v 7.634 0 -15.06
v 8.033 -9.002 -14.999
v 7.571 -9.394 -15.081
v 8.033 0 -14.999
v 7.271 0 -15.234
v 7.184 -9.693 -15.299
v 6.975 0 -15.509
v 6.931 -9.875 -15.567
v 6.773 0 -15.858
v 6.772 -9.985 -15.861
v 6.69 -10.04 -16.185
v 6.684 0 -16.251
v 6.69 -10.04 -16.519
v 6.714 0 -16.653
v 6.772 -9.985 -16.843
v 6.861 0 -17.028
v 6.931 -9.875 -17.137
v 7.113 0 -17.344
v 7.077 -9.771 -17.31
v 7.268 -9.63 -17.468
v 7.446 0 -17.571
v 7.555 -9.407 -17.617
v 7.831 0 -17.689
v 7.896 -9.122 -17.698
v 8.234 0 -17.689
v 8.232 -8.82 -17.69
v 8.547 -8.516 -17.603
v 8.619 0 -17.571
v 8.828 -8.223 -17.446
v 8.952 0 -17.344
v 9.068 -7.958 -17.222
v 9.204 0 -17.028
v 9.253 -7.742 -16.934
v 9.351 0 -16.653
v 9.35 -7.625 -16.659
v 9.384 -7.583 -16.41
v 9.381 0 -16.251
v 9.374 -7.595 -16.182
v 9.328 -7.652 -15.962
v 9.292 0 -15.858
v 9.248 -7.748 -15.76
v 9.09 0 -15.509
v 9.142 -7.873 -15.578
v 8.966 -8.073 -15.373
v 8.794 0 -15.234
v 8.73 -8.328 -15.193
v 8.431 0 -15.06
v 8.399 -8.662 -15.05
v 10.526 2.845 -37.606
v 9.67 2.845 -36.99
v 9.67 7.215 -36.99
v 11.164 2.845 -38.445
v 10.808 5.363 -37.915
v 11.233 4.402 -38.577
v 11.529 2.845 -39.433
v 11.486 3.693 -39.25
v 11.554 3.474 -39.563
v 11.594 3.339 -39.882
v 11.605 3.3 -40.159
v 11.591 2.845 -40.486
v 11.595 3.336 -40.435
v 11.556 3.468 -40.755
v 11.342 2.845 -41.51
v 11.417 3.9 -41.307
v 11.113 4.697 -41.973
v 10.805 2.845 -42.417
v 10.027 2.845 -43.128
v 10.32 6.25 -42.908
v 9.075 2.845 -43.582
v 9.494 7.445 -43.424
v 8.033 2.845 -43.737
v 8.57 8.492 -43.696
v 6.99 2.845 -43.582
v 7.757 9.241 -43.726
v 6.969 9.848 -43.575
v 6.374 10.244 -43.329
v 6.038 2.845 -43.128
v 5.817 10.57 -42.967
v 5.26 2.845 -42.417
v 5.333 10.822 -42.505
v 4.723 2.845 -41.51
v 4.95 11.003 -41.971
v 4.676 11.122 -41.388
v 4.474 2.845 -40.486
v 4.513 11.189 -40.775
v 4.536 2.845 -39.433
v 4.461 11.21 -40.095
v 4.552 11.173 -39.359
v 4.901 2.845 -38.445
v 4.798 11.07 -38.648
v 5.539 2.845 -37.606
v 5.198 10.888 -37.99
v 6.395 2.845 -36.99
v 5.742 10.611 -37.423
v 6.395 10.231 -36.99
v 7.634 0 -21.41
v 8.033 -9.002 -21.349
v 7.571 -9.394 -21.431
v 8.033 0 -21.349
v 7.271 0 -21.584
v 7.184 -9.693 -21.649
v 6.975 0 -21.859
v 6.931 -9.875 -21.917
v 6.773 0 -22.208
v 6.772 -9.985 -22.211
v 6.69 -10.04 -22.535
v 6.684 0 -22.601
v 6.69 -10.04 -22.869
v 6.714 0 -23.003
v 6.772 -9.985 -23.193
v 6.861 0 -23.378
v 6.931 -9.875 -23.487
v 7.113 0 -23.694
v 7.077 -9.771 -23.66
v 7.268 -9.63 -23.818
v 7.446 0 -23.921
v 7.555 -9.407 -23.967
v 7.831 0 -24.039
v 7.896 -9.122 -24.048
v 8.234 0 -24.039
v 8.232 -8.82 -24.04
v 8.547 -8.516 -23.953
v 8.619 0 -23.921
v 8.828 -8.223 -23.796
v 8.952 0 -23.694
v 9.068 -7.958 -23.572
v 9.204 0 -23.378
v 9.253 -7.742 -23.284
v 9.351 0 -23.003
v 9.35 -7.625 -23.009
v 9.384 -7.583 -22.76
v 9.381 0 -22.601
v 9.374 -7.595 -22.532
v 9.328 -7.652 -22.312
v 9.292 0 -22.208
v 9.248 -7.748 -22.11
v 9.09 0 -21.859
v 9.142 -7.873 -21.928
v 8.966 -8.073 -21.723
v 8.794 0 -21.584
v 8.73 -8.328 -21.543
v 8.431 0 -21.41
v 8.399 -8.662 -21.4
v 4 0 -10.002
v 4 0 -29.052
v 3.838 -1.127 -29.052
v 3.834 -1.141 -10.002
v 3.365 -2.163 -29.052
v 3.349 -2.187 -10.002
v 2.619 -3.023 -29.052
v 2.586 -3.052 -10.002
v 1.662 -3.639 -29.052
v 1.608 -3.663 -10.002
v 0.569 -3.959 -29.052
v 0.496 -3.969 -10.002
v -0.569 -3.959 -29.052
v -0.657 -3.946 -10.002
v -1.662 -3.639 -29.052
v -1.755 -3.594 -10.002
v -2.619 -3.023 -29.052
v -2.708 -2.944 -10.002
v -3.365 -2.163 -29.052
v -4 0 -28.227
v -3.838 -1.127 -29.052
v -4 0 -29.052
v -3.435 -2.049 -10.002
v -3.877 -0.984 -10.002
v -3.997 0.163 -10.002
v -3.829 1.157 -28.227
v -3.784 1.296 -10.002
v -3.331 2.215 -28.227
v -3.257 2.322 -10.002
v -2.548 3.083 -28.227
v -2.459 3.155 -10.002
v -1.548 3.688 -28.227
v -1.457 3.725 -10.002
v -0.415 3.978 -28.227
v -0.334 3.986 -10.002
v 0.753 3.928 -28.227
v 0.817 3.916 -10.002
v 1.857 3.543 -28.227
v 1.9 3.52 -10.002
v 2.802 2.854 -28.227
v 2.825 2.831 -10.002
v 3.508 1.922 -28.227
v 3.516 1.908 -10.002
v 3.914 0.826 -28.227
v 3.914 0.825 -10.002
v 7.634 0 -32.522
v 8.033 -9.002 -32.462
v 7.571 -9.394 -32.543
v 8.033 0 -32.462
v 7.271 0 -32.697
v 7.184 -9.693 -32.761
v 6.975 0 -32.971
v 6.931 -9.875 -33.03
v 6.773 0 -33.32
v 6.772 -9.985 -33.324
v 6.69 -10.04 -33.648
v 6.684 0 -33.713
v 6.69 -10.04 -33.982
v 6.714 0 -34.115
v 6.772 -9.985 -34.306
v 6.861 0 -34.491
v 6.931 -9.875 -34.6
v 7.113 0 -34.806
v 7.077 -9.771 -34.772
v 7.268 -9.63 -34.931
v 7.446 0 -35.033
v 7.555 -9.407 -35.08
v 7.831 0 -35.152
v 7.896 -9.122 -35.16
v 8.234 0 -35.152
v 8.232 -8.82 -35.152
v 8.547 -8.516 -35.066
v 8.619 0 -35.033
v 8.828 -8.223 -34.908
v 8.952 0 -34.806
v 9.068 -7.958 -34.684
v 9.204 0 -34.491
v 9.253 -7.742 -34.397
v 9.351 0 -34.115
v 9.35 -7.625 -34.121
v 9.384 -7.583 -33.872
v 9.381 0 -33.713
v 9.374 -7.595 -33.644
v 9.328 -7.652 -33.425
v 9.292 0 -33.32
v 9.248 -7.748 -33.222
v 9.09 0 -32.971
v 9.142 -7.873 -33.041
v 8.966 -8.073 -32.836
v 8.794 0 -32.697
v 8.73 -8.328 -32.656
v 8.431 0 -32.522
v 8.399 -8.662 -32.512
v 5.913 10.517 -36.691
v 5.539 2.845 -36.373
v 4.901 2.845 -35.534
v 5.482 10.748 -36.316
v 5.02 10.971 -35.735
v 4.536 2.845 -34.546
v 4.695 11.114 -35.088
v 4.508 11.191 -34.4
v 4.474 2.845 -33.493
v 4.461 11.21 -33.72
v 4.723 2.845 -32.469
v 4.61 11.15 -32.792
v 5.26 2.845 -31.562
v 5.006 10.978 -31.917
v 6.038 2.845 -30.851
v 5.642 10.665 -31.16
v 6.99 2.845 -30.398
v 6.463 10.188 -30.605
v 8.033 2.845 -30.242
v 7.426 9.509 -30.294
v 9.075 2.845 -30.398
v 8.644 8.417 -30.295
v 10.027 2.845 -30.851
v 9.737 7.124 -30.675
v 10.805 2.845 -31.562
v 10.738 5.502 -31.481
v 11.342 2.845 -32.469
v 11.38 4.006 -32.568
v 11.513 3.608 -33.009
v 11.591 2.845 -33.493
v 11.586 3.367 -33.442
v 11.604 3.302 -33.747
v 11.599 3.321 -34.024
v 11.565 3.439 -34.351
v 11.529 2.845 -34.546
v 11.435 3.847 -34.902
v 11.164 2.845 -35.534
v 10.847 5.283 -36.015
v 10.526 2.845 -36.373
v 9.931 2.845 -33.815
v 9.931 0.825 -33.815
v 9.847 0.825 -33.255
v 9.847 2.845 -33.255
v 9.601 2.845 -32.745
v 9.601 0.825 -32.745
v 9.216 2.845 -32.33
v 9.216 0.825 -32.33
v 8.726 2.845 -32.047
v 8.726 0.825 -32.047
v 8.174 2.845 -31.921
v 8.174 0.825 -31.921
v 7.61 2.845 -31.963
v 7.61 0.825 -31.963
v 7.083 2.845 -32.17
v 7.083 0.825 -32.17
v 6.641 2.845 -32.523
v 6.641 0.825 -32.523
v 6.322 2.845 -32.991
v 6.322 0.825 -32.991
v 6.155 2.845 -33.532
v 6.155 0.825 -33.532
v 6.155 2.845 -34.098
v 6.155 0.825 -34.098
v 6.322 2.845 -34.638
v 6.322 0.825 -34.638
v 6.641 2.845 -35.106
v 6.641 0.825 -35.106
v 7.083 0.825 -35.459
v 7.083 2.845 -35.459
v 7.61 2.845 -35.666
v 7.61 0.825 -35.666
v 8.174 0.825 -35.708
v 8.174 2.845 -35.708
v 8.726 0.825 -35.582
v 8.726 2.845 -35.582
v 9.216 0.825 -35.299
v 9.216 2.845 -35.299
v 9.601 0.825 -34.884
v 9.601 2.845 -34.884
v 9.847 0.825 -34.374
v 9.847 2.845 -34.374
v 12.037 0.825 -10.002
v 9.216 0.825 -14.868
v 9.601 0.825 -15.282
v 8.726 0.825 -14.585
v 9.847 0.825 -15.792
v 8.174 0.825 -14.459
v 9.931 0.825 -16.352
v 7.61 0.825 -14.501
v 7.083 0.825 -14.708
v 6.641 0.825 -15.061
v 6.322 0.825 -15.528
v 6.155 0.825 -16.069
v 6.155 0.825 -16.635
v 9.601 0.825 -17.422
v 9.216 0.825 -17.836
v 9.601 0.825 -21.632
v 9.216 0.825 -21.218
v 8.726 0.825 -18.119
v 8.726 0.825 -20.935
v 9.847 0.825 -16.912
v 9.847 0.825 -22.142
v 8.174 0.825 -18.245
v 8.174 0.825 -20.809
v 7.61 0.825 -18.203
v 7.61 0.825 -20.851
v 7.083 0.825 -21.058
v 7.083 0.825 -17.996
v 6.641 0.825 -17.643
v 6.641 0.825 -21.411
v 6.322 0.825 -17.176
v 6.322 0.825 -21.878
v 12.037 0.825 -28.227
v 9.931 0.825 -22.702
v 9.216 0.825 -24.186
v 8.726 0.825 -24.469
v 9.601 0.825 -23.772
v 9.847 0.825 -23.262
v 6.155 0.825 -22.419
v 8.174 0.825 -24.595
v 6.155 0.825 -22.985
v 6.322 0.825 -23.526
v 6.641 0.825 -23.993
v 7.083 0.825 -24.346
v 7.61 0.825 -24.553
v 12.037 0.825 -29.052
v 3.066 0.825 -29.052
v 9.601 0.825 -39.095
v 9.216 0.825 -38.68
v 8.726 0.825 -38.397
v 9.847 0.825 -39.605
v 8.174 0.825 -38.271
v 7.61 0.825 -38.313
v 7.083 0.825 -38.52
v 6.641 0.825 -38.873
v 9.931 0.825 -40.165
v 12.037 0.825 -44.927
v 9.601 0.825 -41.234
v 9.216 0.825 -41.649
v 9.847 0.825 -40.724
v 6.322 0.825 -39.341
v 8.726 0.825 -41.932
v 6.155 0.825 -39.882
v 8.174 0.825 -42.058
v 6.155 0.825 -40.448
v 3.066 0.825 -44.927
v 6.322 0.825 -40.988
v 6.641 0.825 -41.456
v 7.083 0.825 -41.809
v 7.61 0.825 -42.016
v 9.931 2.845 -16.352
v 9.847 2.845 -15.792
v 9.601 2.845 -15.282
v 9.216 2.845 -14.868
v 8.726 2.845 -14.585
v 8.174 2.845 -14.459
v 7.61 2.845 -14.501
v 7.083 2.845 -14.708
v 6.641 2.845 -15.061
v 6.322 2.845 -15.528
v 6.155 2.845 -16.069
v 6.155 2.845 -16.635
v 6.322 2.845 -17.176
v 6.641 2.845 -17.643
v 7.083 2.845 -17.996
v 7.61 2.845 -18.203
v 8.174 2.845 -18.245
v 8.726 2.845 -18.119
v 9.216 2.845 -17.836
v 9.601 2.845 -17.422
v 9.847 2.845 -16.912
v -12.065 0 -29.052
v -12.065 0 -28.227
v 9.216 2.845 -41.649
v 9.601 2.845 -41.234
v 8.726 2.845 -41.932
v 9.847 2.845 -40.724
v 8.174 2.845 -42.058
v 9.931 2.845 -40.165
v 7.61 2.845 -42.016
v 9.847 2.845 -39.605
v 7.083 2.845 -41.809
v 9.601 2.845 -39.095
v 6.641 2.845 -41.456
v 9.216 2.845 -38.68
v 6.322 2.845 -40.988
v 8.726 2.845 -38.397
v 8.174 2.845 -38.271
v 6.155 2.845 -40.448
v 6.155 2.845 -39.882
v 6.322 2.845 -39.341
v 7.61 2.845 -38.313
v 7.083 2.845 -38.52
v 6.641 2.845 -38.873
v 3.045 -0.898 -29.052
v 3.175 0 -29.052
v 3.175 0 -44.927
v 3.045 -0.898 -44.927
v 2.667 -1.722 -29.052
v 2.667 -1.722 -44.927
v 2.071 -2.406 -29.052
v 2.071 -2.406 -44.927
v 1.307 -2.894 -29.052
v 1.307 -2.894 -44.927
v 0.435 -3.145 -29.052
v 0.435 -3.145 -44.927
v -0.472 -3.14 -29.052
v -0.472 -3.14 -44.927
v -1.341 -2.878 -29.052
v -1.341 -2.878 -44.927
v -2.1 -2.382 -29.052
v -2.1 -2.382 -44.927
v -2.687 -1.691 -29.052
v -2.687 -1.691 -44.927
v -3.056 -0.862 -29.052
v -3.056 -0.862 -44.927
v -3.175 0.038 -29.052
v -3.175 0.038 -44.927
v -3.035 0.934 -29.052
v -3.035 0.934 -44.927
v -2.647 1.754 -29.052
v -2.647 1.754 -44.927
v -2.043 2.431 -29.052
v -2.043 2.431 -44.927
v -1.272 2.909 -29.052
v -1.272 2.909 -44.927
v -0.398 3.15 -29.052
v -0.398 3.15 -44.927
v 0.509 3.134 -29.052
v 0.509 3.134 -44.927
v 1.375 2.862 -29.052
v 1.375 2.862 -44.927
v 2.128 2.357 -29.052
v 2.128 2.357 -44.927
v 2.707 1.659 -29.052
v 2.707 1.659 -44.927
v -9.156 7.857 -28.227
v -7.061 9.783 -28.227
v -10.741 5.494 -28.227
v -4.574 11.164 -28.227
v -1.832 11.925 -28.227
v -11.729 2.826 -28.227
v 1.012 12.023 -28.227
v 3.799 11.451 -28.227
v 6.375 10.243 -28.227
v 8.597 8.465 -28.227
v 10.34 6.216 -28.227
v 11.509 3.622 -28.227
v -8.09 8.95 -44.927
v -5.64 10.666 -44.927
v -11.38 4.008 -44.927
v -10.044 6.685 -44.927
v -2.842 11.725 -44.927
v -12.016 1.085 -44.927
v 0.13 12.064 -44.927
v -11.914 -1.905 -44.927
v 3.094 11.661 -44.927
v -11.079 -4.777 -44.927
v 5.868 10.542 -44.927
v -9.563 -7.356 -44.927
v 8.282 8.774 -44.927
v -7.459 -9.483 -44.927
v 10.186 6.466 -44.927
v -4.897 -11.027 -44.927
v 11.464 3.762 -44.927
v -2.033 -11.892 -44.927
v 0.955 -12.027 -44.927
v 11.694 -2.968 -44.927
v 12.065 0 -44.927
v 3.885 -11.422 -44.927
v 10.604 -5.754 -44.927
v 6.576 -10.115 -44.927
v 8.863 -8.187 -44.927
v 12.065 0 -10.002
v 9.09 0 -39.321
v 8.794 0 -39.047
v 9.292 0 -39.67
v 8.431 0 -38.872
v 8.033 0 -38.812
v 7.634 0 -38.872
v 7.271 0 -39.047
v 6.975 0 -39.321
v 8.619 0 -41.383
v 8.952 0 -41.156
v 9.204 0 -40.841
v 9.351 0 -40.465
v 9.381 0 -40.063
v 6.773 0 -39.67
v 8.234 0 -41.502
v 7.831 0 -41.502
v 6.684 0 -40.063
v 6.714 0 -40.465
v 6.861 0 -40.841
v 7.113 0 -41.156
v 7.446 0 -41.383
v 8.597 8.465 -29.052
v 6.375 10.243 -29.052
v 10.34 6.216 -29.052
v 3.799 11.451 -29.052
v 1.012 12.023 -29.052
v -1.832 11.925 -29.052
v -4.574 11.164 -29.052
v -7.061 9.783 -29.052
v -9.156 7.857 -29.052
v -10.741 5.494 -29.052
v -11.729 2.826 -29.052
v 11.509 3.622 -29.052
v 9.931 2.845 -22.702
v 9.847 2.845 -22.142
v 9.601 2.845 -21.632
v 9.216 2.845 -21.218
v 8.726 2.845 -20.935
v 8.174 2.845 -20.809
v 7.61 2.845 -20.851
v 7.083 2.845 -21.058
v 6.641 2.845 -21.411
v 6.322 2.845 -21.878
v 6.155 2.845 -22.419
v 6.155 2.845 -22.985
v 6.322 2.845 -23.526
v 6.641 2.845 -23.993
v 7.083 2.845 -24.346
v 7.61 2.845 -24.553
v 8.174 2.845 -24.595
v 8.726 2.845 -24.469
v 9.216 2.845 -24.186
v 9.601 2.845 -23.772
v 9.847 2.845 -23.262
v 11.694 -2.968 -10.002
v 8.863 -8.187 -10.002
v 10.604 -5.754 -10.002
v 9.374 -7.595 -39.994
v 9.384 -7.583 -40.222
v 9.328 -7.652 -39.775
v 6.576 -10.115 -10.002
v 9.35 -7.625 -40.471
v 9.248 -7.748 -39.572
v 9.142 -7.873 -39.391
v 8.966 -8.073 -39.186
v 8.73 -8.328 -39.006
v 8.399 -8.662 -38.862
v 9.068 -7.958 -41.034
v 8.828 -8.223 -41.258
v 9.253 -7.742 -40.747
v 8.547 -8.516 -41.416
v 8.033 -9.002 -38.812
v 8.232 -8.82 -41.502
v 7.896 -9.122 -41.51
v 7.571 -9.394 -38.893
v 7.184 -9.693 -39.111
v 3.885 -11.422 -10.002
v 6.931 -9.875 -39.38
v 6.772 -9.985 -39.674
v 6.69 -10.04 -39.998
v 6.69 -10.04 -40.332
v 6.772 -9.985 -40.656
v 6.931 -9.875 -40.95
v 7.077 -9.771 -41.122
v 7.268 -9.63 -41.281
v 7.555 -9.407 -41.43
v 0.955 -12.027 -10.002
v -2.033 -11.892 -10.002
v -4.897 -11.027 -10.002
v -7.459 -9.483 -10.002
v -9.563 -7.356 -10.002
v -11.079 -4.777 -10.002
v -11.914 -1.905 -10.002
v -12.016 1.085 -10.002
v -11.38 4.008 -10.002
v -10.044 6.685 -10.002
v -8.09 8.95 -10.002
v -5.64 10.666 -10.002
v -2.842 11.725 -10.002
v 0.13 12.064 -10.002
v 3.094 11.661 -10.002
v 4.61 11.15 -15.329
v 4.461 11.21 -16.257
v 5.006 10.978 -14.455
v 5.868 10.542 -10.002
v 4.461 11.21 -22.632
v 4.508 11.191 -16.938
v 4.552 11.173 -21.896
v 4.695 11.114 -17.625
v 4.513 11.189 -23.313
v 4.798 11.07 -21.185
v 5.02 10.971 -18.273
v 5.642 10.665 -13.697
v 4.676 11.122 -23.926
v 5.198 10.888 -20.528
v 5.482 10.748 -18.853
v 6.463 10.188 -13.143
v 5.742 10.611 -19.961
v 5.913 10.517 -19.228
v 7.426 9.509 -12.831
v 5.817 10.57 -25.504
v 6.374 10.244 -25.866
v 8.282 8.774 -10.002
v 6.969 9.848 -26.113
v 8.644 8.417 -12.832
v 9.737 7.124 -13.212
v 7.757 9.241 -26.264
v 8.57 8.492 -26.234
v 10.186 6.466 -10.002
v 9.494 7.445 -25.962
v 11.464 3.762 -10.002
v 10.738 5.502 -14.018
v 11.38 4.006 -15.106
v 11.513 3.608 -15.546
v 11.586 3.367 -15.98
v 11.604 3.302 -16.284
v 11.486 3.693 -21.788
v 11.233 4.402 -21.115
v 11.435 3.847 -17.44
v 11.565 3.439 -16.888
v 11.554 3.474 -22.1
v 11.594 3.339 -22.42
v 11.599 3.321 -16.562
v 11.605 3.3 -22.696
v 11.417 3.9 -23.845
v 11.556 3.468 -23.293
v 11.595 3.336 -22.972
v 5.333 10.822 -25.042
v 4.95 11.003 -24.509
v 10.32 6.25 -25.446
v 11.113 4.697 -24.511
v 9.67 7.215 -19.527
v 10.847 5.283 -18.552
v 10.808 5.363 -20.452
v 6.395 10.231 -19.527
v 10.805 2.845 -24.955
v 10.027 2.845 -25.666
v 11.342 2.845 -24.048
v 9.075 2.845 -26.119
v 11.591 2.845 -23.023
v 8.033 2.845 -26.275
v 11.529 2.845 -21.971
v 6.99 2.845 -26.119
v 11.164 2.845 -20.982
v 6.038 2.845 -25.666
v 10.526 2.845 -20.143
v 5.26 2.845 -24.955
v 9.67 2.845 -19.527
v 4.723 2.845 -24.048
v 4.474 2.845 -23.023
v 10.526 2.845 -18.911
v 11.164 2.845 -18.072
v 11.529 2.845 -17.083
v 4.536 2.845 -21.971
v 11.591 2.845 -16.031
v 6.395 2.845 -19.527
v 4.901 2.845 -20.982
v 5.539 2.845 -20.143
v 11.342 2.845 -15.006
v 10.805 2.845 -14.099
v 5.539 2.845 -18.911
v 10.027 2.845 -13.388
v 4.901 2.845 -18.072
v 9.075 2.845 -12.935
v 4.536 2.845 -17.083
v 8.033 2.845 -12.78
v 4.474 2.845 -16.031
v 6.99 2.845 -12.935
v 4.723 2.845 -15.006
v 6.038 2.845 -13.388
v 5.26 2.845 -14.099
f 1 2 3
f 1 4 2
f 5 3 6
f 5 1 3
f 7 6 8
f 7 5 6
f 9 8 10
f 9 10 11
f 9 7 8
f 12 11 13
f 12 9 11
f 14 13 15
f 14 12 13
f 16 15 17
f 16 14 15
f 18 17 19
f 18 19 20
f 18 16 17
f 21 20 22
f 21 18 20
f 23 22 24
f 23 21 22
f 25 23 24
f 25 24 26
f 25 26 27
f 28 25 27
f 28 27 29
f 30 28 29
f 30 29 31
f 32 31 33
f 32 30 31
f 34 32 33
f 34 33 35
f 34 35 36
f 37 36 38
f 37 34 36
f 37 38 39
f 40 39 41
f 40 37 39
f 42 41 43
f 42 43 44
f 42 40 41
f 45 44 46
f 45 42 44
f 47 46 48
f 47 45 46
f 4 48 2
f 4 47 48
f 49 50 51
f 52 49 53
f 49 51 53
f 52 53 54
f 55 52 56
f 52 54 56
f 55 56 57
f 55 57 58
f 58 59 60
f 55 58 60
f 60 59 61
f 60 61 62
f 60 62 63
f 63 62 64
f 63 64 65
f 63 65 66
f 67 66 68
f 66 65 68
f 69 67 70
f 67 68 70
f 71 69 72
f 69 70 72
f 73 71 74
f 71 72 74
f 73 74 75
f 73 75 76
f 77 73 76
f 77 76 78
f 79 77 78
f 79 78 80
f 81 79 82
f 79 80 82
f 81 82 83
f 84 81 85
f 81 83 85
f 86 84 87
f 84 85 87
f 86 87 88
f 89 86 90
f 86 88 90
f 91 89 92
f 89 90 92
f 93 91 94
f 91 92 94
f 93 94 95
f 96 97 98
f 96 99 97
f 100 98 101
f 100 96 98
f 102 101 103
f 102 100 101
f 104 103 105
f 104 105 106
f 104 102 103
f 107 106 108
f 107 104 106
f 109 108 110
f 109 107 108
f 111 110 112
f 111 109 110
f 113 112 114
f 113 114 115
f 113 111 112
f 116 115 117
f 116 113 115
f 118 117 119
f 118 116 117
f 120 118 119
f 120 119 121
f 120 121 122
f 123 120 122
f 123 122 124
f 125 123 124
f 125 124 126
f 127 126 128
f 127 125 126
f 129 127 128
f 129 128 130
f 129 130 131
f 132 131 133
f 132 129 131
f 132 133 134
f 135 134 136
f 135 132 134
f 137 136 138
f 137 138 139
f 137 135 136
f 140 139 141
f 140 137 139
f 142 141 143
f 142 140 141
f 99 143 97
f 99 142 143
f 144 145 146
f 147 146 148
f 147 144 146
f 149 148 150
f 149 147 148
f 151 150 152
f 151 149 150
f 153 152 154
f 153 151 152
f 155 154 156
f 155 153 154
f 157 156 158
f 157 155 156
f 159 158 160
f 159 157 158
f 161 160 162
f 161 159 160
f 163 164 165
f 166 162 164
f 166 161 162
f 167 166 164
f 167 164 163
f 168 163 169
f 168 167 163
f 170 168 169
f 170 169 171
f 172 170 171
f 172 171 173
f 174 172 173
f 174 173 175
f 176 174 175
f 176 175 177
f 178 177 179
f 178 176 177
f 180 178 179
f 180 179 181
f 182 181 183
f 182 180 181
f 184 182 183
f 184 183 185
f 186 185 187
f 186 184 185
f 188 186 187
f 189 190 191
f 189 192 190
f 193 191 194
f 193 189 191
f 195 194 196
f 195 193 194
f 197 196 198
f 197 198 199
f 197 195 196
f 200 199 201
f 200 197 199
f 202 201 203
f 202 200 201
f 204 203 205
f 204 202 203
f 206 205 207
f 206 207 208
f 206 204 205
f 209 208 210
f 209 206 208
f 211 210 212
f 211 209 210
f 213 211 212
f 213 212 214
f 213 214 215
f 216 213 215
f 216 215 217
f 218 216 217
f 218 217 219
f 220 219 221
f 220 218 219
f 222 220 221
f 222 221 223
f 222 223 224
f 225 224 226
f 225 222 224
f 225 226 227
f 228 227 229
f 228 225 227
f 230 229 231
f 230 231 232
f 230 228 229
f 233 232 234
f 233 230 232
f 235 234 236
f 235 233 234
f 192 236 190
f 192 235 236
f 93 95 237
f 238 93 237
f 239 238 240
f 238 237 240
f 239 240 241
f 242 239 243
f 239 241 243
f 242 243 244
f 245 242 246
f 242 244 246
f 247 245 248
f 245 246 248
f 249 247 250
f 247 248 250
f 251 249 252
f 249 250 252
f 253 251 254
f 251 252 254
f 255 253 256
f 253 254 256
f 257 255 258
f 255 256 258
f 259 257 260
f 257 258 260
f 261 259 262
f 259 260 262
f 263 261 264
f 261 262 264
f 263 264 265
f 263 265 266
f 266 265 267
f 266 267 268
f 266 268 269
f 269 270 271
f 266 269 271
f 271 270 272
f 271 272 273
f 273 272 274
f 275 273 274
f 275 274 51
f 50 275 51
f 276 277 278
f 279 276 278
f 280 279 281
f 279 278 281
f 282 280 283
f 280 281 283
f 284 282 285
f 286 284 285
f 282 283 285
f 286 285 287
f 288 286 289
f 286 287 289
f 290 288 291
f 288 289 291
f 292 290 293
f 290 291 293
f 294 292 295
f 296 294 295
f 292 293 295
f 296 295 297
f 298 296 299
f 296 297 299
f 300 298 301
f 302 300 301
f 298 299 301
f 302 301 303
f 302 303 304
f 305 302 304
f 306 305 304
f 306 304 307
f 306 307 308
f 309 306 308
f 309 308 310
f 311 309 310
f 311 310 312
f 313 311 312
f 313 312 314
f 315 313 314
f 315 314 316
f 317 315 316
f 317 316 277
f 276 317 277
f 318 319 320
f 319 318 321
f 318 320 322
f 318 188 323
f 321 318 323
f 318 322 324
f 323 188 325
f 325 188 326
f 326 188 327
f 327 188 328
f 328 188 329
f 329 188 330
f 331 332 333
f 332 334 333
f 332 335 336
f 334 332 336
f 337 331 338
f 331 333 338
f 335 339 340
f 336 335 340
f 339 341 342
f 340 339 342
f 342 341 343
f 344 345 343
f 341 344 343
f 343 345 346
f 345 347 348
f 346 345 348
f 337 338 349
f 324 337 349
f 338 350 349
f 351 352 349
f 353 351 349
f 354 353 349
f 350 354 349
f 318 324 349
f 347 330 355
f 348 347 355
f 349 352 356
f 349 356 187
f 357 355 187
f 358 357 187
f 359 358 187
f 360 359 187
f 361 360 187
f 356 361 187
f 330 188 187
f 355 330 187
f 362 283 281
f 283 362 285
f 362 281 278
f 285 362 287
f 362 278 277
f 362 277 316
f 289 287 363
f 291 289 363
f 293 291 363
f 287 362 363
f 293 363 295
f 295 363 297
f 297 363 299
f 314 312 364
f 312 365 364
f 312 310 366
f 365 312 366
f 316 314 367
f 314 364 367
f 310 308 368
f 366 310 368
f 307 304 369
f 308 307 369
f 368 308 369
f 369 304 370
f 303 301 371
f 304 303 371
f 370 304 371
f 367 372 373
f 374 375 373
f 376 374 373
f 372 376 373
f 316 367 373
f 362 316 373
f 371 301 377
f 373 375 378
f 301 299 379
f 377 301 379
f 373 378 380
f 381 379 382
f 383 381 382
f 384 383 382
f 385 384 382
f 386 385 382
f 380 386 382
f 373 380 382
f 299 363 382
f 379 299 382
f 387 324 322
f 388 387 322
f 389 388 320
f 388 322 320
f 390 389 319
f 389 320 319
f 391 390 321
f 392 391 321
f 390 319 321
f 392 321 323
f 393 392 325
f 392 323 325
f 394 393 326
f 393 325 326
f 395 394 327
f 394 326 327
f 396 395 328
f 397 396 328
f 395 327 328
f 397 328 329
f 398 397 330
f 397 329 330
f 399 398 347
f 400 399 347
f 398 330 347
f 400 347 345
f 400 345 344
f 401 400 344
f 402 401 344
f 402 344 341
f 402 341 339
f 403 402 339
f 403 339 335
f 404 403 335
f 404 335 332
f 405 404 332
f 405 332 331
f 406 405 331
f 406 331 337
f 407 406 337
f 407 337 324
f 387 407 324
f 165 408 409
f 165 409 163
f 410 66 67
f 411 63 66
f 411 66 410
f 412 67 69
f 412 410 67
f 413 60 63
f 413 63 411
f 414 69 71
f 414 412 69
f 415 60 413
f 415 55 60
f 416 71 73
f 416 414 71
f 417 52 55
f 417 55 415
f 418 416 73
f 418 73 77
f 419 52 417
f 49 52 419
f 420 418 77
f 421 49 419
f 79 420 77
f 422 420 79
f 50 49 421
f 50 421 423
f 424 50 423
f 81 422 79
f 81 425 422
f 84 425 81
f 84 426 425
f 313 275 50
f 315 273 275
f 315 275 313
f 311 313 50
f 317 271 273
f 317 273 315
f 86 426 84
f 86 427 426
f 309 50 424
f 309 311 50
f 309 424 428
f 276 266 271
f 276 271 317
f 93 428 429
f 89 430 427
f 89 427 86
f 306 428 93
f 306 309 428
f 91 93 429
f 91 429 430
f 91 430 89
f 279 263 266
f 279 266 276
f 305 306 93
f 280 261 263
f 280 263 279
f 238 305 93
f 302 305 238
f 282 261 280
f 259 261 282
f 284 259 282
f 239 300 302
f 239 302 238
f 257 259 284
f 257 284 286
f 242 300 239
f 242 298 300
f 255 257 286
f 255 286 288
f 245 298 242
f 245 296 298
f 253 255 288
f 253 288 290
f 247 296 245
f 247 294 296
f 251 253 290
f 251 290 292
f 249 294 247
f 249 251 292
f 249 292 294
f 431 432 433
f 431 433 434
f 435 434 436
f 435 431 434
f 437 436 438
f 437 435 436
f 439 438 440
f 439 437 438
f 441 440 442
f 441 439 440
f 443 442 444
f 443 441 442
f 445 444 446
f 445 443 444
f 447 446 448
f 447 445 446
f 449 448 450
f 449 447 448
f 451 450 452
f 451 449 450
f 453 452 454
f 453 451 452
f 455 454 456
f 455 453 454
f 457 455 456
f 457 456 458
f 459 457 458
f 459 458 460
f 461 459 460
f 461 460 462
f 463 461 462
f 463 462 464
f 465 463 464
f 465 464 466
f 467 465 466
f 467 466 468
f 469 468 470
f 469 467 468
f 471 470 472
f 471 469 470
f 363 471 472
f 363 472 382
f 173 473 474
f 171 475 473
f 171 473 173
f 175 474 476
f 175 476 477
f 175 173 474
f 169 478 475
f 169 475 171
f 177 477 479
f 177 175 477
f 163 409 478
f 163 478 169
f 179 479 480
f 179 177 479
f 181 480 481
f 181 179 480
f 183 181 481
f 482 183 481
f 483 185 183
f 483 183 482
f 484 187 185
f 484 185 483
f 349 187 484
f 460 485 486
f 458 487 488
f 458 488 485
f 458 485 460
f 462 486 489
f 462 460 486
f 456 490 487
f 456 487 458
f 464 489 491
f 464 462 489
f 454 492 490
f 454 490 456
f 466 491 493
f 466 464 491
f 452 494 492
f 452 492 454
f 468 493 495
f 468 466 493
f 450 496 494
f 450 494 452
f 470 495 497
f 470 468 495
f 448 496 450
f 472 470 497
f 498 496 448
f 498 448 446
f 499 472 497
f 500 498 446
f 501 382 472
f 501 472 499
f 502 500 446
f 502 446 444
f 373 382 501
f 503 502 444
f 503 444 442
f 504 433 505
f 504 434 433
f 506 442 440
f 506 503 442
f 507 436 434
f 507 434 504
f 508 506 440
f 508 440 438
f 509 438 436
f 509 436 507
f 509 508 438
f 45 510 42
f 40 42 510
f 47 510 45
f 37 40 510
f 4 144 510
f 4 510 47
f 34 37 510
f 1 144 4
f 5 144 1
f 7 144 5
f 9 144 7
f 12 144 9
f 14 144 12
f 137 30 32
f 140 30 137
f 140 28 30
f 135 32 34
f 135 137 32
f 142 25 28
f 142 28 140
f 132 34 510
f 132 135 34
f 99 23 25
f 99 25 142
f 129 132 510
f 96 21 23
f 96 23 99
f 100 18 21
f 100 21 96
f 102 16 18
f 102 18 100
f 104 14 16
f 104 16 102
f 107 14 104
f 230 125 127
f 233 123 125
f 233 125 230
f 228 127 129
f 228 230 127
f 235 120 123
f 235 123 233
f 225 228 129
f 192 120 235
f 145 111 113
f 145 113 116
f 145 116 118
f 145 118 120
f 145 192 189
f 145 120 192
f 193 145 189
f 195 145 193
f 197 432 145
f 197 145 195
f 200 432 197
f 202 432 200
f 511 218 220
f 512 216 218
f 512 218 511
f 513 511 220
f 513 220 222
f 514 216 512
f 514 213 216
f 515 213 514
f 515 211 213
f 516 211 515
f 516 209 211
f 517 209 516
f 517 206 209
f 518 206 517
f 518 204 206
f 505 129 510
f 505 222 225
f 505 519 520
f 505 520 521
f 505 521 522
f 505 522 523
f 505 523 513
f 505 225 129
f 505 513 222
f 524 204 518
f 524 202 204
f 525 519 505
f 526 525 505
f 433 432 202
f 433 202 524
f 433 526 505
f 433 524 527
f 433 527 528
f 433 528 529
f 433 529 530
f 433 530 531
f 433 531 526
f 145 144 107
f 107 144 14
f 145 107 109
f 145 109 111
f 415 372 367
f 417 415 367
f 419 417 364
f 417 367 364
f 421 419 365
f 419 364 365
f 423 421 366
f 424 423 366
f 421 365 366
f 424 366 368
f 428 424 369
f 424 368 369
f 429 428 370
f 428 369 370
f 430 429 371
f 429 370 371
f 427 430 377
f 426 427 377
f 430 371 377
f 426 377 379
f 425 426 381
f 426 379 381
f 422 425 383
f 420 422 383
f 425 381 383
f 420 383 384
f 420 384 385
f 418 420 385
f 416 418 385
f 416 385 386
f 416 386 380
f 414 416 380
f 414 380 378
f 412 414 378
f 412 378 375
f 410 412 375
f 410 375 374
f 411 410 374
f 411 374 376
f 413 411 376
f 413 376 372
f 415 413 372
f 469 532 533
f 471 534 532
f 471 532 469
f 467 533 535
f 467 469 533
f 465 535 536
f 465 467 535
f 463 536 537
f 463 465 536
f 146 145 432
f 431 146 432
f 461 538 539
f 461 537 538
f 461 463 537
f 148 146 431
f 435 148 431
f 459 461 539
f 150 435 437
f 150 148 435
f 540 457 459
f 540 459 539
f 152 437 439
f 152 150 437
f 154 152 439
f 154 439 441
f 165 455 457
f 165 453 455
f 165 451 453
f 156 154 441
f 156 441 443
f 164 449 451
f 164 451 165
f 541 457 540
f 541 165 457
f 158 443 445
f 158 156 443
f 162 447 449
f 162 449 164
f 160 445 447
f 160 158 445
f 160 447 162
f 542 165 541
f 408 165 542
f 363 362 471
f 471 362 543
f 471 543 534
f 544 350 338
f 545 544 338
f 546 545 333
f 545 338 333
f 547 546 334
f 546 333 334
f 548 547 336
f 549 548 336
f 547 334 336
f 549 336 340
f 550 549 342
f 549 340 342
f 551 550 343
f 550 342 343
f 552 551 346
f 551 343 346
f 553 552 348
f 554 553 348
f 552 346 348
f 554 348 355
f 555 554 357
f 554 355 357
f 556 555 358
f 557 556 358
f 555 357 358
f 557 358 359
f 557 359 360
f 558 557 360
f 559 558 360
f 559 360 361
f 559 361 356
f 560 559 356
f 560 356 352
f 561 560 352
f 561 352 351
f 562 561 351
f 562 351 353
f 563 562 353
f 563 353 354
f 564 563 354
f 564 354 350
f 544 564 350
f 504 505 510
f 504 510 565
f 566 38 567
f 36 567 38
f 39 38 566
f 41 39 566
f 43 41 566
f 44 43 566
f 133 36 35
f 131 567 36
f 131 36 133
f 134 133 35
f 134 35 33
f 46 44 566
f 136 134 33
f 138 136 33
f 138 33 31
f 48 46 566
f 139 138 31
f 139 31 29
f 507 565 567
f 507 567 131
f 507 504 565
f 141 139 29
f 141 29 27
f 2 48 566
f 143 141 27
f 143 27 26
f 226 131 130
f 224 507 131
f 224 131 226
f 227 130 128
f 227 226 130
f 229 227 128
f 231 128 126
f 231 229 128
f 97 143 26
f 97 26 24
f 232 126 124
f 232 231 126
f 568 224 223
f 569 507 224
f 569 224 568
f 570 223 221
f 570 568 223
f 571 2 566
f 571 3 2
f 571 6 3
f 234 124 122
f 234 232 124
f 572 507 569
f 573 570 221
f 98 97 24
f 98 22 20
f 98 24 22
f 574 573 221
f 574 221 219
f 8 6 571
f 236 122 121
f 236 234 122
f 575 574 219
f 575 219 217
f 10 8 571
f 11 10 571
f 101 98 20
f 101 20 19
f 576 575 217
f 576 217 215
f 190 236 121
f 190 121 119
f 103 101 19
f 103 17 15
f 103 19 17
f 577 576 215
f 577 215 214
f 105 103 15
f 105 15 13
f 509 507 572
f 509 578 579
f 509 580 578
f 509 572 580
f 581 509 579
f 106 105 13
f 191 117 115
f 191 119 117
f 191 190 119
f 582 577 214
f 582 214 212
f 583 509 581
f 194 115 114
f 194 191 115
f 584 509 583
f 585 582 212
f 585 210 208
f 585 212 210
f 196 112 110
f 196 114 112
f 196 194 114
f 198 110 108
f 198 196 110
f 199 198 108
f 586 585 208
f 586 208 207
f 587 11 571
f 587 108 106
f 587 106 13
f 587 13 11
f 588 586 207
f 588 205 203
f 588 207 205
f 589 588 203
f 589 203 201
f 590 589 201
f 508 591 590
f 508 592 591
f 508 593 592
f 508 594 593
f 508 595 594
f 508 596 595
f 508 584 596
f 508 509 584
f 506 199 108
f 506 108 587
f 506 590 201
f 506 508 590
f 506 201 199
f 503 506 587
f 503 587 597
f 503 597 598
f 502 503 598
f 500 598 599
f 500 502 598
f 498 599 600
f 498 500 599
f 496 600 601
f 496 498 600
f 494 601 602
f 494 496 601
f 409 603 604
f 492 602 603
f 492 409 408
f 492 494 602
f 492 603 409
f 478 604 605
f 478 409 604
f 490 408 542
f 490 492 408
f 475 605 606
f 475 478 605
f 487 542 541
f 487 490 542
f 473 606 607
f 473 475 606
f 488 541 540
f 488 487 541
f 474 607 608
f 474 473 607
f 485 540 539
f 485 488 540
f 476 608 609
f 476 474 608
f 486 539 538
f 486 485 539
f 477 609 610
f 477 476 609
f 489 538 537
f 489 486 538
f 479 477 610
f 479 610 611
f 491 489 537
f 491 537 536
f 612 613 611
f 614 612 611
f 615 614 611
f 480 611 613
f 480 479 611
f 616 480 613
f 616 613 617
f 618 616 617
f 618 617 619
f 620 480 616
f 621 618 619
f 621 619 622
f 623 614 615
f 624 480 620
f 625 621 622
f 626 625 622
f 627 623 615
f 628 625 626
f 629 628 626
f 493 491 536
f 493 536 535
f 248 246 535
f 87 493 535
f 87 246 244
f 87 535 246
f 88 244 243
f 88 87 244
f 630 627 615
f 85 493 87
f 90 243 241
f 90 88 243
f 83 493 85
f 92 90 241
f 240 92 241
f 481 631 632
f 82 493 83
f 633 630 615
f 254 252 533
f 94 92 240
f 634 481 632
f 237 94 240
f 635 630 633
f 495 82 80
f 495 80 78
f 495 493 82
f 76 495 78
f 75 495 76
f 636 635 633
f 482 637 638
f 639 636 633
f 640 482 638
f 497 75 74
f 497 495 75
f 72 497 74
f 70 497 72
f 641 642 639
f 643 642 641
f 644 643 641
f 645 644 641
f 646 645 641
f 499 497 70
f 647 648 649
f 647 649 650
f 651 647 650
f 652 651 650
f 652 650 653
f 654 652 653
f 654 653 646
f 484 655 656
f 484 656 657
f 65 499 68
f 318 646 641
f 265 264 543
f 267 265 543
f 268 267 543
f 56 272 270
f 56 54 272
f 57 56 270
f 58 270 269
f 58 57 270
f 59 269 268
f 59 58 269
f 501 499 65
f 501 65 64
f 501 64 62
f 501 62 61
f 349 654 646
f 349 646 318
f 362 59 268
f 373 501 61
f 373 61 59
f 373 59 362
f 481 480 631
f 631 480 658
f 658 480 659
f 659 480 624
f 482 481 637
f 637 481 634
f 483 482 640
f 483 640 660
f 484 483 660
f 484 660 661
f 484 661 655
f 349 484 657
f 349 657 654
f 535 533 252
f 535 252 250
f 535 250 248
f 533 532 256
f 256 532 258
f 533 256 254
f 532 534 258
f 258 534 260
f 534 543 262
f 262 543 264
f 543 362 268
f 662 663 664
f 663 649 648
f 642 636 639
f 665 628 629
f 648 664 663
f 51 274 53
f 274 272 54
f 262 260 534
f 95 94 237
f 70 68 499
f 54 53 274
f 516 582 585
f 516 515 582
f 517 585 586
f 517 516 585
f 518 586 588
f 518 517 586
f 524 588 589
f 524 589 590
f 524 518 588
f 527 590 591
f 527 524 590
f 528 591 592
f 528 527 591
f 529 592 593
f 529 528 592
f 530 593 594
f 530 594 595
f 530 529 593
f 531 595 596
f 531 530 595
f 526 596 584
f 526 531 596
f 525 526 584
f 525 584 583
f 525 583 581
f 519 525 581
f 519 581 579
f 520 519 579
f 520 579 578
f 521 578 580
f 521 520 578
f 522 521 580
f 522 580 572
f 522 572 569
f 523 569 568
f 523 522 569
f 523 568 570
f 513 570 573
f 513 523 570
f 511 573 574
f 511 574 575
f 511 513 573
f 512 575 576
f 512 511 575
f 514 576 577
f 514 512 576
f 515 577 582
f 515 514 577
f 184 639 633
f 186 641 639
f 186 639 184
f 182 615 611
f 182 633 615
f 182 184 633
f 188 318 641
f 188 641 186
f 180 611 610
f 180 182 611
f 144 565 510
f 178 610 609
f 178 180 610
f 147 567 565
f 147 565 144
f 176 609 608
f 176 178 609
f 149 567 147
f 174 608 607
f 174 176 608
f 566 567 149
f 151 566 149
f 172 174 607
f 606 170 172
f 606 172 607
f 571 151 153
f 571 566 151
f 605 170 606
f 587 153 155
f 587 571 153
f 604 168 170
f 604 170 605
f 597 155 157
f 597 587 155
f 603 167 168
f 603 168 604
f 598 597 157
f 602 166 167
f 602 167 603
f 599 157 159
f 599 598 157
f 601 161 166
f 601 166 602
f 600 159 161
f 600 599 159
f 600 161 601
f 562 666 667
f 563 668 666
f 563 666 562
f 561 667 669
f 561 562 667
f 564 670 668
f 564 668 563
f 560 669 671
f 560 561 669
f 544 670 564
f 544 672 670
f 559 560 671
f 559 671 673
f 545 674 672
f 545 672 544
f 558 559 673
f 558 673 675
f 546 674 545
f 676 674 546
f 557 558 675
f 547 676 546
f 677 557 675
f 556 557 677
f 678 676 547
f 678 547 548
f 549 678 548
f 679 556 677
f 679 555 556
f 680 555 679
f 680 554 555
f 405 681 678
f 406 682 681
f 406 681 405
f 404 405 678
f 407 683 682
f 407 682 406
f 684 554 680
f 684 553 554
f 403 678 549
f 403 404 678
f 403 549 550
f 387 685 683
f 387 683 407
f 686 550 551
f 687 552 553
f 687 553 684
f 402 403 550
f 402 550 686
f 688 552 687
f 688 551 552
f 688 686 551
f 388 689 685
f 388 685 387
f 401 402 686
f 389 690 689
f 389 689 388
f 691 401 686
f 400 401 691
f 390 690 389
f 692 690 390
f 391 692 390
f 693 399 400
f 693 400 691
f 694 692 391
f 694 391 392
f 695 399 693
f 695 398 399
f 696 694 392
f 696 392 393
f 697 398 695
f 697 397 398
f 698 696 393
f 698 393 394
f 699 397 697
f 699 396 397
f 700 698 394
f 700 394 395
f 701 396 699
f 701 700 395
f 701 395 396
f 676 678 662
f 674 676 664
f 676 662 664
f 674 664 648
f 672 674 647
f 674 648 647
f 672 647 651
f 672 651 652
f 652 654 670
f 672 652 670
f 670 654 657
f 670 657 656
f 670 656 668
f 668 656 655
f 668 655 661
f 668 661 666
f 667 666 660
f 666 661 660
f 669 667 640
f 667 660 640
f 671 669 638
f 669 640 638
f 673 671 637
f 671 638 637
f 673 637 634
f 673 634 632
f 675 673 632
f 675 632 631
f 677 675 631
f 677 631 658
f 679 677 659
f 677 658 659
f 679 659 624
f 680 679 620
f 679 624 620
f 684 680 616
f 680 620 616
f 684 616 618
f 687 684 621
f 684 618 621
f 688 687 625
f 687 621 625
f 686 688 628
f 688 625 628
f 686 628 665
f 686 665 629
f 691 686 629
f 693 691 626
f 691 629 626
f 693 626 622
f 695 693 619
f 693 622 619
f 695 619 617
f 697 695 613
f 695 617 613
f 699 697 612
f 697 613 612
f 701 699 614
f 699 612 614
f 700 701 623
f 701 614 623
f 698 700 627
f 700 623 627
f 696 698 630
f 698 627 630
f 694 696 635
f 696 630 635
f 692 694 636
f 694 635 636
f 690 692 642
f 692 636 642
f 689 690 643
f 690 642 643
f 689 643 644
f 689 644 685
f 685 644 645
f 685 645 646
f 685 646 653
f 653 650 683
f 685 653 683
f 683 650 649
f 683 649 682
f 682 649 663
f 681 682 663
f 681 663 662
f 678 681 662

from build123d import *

# Parameters (mm, degrees)
SKETCH4_W                                      = 24.13
SKETCH4_H                                      = 0.8255
CUT_EXTRUDE1_DEPTH                             = 49.057945385
SKETCH5_W                                      = 34.925
SKETCH5_H                                      = 0.8255
CUT_EXTRUDE2_DEPTH                             = 49.057945385
F_6_32_TAPPED_HOLE1_AT_2_COUNT                 = 2
F_6_32_TAPPED_HOLE1_AT_2_PITCH                 = 6.35
F_6_32_TAPPED_HOLE1_AT_3_COUNT                 = 2
F_6_32_TAPPED_HOLE1_AT_3_PITCH                 = 17.4625
F_6_32_TAPPED_HOLE1_AT_4_COUNT                 = 2
F_6_32_TAPPED_HOLE1_AT_4_PITCH                 = 23.8125
CBORE_FOR_6_SOCKET_HEAD_CAP_SCREW1_D           = 3.7973
CBORE_FOR_6_SOCKET_HEAD_CAP_SCREW1_DEPTH       = 11.8745
CBORE_FOR_6_SOCKET_HEAD_CAP_SCREW1_CBORE_D     = 7.14502
CBORE_FOR_6_SOCKET_HEAD_CAP_SCREW1_CBORE_DEPTH = 9.8552


with BuildPart() as part:
    # Sketch1 → Revolve1 (revolve)
    with BuildSketch(Plane(origin=(0, 0, 0), x_dir=(1, 0, 0), z_dir=(0, 1, 0))):
        Polygon((3.175, 44.927025994), (3.175, 29.052025994), (4, 29.052025994), (4, 10.002025994), (12.065, 10.002025994), (12.065, 44.927025994), align=None)
    revolve(axis=Axis((0, 0, 0), (0, 0, -1)))

    # Sketch4 → Cut-Extrude1 (cut, through all)
    with BuildSketch(Plane(origin=(0, 0, 0), x_dir=(1, 0, 0), z_dir=(0, 1, 0))):
        with Locations((0, 28.639275994)):
            Rectangle(SKETCH4_W, SKETCH4_H)
    extrude(amount=CUT_EXTRUDE1_DEPTH, mode=Mode.SUBTRACT)

    # Sketch5 → Cut-Extrude2 (cut, through all)
    with BuildSketch(Plane(origin=(0, 0, 0), x_dir=(0, 0, -1), z_dir=(1, 0, 0))):
        with Locations((27.464525994, 0.41275)):
            Rectangle(SKETCH5_W, SKETCH5_H)
    extrude(amount=CUT_EXTRUDE2_DEPTH, mode=Mode.SUBTRACT)

    # Sketch6 → #6-32 Tapped Hole1 (revolve, cut)
    with BuildSketch(Plane(origin=(8.0325, 0, -16.352025994), x_dir=(0, 0, 1), z_dir=(1, 0, 0))):
        Polygon((0, 0), (0, 11.98869403), (1.35255, 11.176), (1.35255, 0), align=None)
    f_6_32_tapped_hole1 = revolve(axis=Axis((8.0325, 6.35, -16.352025994), (0, -1, 0)), mode=Mode.SUBTRACT)

    # #6-32 Tapped Hole1 at 2: #6-32 Tapped Hole1 ×2
    with Locations(*[(0, 0, -i * F_6_32_TAPPED_HOLE1_AT_2_PITCH) for i in range(1, F_6_32_TAPPED_HOLE1_AT_2_COUNT)]):
        add(f_6_32_tapped_hole1, mode=Mode.SUBTRACT)

    # #6-32 Tapped Hole1 at 3: #6-32 Tapped Hole1 ×2
    with Locations(*[(0, 0, -i * F_6_32_TAPPED_HOLE1_AT_3_PITCH) for i in range(1, F_6_32_TAPPED_HOLE1_AT_3_COUNT)]):
        add(f_6_32_tapped_hole1, mode=Mode.SUBTRACT)

    # #6-32 Tapped Hole1 at 4: #6-32 Tapped Hole1 ×2
    with Locations(*[(0, 0, -i * F_6_32_TAPPED_HOLE1_AT_4_PITCH) for i in range(1, F_6_32_TAPPED_HOLE1_AT_4_COUNT)]):
        add(f_6_32_tapped_hole1, mode=Mode.SUBTRACT)

    # CBORE for #6 Socket Head Cap Screw1
    with Locations(Plane(origin=(0, 12.7, 0), x_dir=(-1, 0, 0), z_dir=(0, 1, 0))):
        with Locations((-8.0325, -16.352025994), (-8.0325, -22.702025994), (-8.0325, -33.814525994), (-8.0325, -40.164525994)):
            CounterBoreHole(CBORE_FOR_6_SOCKET_HEAD_CAP_SCREW1_D / 2, CBORE_FOR_6_SOCKET_HEAD_CAP_SCREW1_CBORE_D / 2, CBORE_FOR_6_SOCKET_HEAD_CAP_SCREW1_CBORE_DEPTH, depth=CBORE_FOR_6_SOCKET_HEAD_CAP_SCREW1_DEPTH)


solid = part.part
